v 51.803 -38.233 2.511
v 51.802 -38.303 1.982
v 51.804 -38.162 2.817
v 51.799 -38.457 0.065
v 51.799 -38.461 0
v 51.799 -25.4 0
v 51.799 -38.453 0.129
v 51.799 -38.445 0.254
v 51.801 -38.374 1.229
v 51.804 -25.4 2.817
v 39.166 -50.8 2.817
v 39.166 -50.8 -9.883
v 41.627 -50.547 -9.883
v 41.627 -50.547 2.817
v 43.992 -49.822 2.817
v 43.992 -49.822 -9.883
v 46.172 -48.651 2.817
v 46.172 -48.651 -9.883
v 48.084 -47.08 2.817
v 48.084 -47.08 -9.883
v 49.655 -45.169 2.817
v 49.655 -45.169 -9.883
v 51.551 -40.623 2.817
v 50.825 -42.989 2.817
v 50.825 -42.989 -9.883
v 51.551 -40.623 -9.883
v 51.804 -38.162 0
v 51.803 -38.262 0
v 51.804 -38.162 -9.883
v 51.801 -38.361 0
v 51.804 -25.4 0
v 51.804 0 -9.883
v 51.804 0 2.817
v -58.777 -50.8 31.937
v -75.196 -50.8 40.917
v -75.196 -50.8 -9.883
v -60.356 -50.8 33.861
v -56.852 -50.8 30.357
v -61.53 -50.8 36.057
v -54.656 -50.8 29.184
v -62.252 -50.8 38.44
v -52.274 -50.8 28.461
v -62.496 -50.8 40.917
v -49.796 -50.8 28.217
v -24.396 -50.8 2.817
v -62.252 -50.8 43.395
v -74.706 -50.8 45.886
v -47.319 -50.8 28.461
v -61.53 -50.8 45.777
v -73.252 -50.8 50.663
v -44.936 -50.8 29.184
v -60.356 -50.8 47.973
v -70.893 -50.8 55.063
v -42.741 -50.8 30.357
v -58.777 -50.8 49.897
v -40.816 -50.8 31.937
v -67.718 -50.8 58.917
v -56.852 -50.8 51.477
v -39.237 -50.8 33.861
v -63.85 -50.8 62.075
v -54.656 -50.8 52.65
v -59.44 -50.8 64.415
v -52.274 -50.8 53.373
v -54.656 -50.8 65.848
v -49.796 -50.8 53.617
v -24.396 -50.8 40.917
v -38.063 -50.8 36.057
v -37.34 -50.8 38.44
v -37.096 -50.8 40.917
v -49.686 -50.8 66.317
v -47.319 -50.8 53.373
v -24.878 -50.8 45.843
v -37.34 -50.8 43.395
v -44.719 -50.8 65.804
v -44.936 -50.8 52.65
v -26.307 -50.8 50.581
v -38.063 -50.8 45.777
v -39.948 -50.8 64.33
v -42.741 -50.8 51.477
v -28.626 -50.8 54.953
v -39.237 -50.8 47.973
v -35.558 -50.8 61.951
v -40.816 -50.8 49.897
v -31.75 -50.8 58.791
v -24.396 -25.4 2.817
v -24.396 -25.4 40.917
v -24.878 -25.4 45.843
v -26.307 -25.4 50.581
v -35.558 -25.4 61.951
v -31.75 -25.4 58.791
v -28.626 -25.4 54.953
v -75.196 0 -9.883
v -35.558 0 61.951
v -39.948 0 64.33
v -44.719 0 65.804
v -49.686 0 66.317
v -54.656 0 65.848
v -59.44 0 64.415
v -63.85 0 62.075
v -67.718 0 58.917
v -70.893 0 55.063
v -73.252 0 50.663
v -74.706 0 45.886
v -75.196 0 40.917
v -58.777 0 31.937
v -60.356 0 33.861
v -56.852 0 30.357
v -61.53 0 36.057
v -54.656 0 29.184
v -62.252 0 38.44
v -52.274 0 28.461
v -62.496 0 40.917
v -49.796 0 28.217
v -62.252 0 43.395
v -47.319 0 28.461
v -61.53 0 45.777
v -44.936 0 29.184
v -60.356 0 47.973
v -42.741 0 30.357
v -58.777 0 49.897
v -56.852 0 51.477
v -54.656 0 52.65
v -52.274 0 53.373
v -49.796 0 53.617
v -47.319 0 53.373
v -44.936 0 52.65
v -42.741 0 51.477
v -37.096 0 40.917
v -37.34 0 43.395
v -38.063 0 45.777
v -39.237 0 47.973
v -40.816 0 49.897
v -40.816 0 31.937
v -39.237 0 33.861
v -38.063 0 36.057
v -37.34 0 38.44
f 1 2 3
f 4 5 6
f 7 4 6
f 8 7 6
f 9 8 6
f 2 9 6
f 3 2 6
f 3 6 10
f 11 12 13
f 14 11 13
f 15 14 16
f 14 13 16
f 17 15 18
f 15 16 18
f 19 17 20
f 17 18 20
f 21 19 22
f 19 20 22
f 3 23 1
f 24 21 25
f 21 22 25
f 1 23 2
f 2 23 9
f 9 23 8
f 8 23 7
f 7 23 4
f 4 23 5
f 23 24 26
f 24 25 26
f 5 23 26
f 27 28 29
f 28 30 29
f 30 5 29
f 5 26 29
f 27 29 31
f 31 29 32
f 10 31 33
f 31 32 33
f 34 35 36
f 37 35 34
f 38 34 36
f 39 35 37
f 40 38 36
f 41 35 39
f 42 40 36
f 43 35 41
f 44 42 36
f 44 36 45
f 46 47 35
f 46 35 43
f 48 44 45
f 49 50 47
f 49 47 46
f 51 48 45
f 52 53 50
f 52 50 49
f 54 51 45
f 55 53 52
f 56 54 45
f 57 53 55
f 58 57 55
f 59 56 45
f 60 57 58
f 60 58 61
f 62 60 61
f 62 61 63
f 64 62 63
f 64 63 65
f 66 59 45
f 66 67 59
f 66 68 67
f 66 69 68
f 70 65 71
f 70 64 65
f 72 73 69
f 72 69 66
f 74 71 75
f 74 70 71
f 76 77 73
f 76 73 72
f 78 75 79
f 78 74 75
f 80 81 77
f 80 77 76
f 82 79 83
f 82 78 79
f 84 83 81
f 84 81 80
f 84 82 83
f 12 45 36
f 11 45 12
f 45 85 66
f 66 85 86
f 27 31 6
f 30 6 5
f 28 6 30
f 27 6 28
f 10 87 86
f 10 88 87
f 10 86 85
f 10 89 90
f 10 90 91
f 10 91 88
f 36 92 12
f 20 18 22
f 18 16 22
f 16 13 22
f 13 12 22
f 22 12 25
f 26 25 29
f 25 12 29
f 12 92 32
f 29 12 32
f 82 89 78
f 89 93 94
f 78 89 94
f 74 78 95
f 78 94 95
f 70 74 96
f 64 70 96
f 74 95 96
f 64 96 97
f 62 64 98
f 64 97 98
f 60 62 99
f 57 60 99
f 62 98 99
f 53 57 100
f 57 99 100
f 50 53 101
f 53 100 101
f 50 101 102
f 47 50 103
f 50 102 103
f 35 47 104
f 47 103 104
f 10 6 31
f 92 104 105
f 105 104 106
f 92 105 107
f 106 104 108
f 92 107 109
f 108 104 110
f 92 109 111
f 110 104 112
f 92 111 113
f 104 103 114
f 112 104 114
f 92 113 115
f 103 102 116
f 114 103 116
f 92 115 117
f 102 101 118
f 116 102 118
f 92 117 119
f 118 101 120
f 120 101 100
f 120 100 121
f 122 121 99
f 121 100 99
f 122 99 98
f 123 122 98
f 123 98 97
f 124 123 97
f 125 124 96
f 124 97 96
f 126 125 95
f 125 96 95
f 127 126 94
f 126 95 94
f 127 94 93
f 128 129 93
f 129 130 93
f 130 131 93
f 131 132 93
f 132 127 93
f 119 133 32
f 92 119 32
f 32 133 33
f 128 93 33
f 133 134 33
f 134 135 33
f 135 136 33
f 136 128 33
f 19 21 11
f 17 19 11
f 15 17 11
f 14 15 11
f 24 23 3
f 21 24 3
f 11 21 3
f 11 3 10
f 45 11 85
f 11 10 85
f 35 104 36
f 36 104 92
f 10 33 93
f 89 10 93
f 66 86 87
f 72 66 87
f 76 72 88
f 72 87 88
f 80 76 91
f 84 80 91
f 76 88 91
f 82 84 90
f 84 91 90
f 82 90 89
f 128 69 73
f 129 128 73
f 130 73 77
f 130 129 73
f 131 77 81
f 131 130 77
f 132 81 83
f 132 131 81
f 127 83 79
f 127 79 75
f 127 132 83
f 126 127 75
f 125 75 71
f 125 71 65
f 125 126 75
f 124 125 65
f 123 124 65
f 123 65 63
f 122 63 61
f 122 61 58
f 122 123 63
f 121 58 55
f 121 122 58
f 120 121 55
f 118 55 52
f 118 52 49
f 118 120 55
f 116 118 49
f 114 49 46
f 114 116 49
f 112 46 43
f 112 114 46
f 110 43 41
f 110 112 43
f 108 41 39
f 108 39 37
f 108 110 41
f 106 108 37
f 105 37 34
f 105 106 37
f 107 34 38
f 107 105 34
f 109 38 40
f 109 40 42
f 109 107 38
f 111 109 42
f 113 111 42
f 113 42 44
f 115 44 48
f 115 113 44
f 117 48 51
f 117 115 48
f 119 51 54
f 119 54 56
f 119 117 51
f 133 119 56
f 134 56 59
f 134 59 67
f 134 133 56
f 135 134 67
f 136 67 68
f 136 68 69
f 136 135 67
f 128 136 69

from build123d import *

# Parameters (mm, degrees)
F0_R        = 12.7
F1_DEPTH    = 25.4
F2_R        = 12.7
F3_DEPTH    = 25.4
F4_T1_DEPTH = 73.3820900713
F4_T6_DEPTH = 61.9223878104


# Not quite as in the source:
# - a fillet or chamfer that OpenCascade refuses, or shapes differently, is made with other operations: its cross-section is extruded or revolved along the edge and cut away or added


with BuildPart() as f1:
    # F0 (on Front) → F1 (new body)
    with BuildSketch(Plane.XZ):
        with BuildLine():
            Line((51.8036965728, 2.8171599331), (-35.5584302991, 61.9514882749))
            ThreePointArc((-35.5584302991, 61.9514882749), (-61.7025627589, 63.353759246), (-75.1963034272, 40.9171599331))
            Line((-75.1963034272, 40.9171599331), (-75.1963034272, -9.8828400669))
            Line((-75.1963034272, -9.8828400669), (51.8036965728, -9.8828400669))
            Line((51.8036965728, -9.8828400669), (51.8036965728, 2.8171599331))
        make_face()
        with Locations((-49.7963034272, 40.9171599331)):
            Circle(F0_R, mode=Mode.SUBTRACT)
    extrude(amount=F1_DEPTH)

    # F2 (on face) → F3 (join)
    with BuildSketch(Plane.XZ.offset(25.4)):
        with BuildLine():
            Line((-24.3963034272, 2.8171599331), (-24.3963034272, 40.9171599331))
            ThreePointArc((-24.3963034272, 40.9171599331), (-27.3597041143, 52.8234192648), (-35.5584302991, 61.9514882749))
            ThreePointArc((-35.5584302991, 61.9514882749), (-61.7025627589, 63.353759246), (-75.1963034272, 40.9171599331))
            Line((-75.1963034272, 40.9171599331), (-75.1963034272, 0))
            Line((-75.1963034272, 0), (-75.1963034272, -9.8828400669))
            Line((-75.1963034272, -9.8828400669), (51.8036965728, -9.8828400669))
            Line((51.8036965728, -9.8828400669), (51.8036965728, -0.3670600709))
            Line((51.8036965728, -0.3670600709), (51.8036965728, 0))
            Line((51.8036965728, 0), (51.7987225249, 0))
            Line((51.7987225249, 0), (51.8036965728, 2.8171599331))
            Line((51.8036965728, 2.8171599331), (-24.3963034272, 2.8171599331))
        make_face()
        with Locations((-49.7963034272, 40.9171599331)):
            Circle(F2_R, mode=Mode.SUBTRACT)
    extrude(amount=F3_DEPTH)

    # F4: fillet of radius 12.7 on 2 edges, made by hand

    # F4_s2 → F4_t1 (cut)
    with BuildSketch(Plane.XY.offset(-41.6324650691)):
        with BuildLine():
            ThreePointArc((39.1038465728, -50.80015), (48.0841026938, -47.0804061211), (51.8038465728, -38.10015))
            Line((51.8038465728, -38.10015), (52.0578465728, -38.10015))
            ThreePointArc((52.0578465728, -38.10015), (52.0576965728, -44.450075), (52.0576965728, -50.8))
            Line((52.0576965728, -50.8), (51.8036965728, -51.054))
            ThreePointArc((51.8036965728, -51.054), (45.4537715728, -51.054), (39.1038465728, -51.05415))
            Line((39.1038465728, -51.05415), (39.1038465728, -50.80015))
        make_face()
    extrude(amount=F4_T1_DEPTH, mode=Mode.SUBTRACT)


with BuildPart() as f4_tool4:
    # F4_s5 → F4_t6 (new body)
    with BuildSketch(Plane.YZ.offset(82.762403454)):
        with BuildLine():
            ThreePointArc((-50.8001462633, -9.8828067947), (-46.3384346707, -2.7734597017), (-38.4165172484, 0.00015))
            Line((-38.4165172484, 0.00015), (-38.4165172484, 0.25415))
            ThreePointArc((-38.4165172484, 0.25415), (-44.6082586242, 0.254), (-50.8, 0.254))
            Line((-50.8, 0.254), (-51.054, 0))
            ThreePointArc((-51.054, 0), (-51.054, -4.9414033973), (-51.0478188436, -9.8264659306))
            Line((-51.0478188436, -9.8264659306), (-50.8001462633, -9.8828067947))
        make_face()
    extrude(amount=-F4_T6_DEPTH)

    split(bisect_by=Plane(origin=(51.7985610464, 0, -0.0914568329), x_dir=(0, 1, 0), z_dir=(0.9999984413, 0, -0.0017656222)), keep=Keep.TOP)


with BuildPart() as f1_1:
    add(f1.part)

    # F4_t3: cut F4_tool4
    add(f4_tool4.part, mode=Mode.SUBTRACT)


solid = f1_1.part
